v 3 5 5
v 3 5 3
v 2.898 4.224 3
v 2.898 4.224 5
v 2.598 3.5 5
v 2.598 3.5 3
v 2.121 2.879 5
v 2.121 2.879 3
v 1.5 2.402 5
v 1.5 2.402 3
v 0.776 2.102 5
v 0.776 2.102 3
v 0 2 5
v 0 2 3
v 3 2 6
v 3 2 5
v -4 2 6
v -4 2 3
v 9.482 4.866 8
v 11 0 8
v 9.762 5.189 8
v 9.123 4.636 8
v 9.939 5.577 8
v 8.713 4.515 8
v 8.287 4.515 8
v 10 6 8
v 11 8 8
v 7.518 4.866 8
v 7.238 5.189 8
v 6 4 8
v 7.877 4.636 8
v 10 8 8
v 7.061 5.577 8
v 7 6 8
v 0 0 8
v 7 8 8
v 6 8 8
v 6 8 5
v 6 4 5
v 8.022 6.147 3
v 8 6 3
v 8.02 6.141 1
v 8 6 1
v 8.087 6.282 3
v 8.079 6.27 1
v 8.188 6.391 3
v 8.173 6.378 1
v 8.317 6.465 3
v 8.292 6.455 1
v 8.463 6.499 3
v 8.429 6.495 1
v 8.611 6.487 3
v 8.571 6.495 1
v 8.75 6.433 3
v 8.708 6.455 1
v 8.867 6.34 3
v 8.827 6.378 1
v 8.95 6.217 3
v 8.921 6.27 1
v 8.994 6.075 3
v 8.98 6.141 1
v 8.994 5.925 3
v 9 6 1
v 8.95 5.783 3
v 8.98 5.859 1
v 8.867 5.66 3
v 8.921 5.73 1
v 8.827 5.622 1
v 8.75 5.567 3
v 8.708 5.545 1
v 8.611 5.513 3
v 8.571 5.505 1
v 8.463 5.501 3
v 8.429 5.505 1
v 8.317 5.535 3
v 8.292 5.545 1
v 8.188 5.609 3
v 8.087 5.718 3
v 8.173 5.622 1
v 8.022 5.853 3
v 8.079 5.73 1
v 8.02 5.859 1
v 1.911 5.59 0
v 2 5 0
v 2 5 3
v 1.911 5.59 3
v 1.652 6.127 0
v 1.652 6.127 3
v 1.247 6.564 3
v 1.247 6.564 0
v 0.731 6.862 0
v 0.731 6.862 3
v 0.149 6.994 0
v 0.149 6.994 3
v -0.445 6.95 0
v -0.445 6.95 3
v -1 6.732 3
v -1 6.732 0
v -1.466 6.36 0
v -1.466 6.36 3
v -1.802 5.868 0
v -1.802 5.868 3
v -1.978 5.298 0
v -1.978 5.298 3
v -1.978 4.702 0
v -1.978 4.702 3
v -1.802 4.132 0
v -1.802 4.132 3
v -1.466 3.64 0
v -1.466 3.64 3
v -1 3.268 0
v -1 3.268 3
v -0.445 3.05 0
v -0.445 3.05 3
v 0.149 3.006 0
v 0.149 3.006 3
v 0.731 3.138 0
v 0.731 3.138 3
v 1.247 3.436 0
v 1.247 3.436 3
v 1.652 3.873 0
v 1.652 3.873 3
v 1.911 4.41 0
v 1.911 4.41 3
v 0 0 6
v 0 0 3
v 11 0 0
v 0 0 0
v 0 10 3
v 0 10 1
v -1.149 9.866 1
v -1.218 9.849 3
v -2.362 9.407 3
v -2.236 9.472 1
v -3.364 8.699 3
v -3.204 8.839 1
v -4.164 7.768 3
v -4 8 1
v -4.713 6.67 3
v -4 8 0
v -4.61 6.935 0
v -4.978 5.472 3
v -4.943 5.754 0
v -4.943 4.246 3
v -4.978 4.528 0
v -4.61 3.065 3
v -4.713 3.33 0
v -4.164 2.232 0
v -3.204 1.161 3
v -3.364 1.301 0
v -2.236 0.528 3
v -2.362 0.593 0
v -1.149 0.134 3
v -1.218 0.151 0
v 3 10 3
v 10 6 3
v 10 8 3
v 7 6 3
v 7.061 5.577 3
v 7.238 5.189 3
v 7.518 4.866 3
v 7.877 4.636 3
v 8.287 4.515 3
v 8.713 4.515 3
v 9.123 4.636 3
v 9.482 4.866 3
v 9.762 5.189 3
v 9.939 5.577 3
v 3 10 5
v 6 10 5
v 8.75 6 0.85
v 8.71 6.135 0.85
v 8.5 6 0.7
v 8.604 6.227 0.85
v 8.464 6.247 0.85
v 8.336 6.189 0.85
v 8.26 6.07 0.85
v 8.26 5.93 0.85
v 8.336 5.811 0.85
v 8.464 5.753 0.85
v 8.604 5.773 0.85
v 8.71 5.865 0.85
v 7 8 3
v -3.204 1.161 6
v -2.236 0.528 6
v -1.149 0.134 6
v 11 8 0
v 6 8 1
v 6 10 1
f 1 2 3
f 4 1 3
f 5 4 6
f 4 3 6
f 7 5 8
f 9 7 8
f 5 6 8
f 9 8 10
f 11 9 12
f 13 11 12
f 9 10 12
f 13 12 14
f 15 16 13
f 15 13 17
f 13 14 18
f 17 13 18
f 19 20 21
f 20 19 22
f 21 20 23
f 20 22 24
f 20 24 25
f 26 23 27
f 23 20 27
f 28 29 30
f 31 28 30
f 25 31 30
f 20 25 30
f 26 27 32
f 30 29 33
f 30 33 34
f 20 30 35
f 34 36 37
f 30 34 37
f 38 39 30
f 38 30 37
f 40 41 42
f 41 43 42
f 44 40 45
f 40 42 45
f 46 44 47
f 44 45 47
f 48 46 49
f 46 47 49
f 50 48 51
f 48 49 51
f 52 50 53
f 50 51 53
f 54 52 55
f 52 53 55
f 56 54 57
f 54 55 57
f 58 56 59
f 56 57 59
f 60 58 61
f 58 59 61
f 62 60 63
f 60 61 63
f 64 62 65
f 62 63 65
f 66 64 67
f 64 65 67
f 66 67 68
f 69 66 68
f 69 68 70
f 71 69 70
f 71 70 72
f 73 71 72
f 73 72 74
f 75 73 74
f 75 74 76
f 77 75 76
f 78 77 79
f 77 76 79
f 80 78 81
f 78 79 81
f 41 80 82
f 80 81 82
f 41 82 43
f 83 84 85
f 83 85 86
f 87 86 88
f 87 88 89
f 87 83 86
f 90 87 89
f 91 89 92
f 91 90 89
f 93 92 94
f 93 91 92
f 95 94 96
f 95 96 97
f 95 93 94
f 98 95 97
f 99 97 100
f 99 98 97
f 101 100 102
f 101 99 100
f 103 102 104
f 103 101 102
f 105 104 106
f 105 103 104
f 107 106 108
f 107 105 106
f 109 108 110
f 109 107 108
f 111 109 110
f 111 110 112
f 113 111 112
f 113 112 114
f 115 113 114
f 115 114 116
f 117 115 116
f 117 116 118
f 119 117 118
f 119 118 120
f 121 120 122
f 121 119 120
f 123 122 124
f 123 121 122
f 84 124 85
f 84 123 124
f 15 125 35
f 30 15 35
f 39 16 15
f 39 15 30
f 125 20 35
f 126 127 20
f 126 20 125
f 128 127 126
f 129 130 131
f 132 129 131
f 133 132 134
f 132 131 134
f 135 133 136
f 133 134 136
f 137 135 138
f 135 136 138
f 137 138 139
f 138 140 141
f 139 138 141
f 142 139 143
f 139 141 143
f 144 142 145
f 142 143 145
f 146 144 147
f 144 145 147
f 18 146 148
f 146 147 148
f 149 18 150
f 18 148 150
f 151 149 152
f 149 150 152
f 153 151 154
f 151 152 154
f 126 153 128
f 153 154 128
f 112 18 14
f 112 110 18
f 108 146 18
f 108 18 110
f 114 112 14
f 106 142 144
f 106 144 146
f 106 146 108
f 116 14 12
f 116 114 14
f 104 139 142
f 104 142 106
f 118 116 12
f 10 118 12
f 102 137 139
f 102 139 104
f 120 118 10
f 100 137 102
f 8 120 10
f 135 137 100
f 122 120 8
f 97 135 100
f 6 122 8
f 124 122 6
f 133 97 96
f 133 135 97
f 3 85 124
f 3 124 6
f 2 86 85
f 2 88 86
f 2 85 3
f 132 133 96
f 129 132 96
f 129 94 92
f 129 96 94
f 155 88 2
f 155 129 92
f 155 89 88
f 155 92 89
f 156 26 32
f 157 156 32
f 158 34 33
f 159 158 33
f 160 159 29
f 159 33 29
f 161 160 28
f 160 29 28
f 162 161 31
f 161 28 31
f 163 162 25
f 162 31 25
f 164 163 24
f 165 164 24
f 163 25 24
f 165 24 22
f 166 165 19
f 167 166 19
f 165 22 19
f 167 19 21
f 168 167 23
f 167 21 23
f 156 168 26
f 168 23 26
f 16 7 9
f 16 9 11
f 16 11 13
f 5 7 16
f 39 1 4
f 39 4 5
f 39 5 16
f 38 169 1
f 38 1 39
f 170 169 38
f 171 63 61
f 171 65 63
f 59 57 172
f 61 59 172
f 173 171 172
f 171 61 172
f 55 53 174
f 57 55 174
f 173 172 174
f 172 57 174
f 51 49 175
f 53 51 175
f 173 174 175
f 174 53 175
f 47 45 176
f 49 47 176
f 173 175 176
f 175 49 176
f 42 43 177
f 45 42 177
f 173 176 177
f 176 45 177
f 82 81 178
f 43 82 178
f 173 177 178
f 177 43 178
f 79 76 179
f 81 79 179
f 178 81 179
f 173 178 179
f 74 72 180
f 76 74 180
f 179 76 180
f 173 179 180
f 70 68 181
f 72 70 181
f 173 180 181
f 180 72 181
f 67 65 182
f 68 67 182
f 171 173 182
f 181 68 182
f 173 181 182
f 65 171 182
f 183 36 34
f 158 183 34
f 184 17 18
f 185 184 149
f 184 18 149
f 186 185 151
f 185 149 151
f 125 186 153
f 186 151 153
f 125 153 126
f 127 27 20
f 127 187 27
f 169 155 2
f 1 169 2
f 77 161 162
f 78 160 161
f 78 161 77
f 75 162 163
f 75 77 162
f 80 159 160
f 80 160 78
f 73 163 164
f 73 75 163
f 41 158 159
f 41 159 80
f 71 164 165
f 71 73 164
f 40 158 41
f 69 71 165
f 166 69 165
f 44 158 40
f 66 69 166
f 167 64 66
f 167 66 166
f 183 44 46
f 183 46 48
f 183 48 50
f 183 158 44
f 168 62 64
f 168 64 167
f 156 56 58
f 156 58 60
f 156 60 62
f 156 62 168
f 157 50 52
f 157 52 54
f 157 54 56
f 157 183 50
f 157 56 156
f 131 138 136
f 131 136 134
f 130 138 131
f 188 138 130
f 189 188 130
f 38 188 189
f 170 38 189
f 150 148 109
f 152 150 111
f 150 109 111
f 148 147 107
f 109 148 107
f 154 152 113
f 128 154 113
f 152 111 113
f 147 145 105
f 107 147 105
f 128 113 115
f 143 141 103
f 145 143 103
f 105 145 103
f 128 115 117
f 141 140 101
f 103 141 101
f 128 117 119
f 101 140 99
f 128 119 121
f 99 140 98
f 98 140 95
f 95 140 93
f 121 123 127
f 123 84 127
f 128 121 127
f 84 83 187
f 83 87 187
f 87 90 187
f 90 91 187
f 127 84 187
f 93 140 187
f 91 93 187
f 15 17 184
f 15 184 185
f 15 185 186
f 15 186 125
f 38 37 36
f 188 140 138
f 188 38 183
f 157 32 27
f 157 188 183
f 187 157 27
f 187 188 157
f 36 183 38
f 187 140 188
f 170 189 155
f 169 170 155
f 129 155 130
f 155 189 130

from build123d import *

# Parameters (mm, degrees)
SKETCH1_R                 = 2
BOSS_EXTRUDE1_DEPTH       = 3
SKETCH2_W                 = 1
SKETCH2_H                 = 2
CUT_EXTRUDE1_DEPTH        = 15
SKETCH3_R                 = 0.5
BOSS_EXTRUDE2_DEPTH       = 5
CUT_EXTRUDE2_DEPTH        = 5
BOSS_EXTRUDE3_DEPTH       = 3
BOSS_EXTRUDE4_DEPTH       = 2
F_1_0MM_DOWEL_HOLE1_D     = 1
F_1_0MM_DOWEL_HOLE1_DEPTH = 2
F_1_0MM_DOWEL_HOLE1_TIP   = 0.30043031


with BuildPart() as part:
    # Sketch1 → Boss-Extrude1 (new body)
    with BuildSketch(Plane.XY):
        with BuildLine():
            Line((0, 0), (11, 0))
            Line((11, 0), (11, 8))
            Line((11, 8), (6, 8))
            Line((6, 8), (6, 10))
            Line((6, 10), (0, 10))
            ThreePointArc((0, 10), (-5, 5), (0, 0))
        make_face()
        with Locations((0, 5)):
            Circle(SKETCH1_R, mode=Mode.SUBTRACT)
    extrude(amount=BOSS_EXTRUDE1_DEPTH)

    # Sketch2 → Cut-Extrude1 (cut)
    with BuildSketch(Plane(origin=(6, 0, 0), x_dir=(0, 0, -1), z_dir=(1, 0, 0))):
        with Locations((-0.5, 9)):
            Rectangle(SKETCH2_W, SKETCH2_H)
    extrude(amount=-CUT_EXTRUDE1_DEPTH, mode=Mode.SUBTRACT)

    # Sketch3 → Boss-Extrude2 (add)
    with BuildSketch(Plane.XY.offset(3)):
        Polygon((11, 8), (11, 0), (0, 0), (6, 4), (6, 8), align=None)
        with Locations((8.5, 6)):
            Circle(SKETCH3_R, mode=Mode.SUBTRACT)
    extrude(amount=BOSS_EXTRUDE2_DEPTH)

    # Sketch4 → Cut-Extrude2 (cut)
    with BuildSketch(Plane.XY.offset(8)):
        with BuildLine():
            Line((7, 8), (7, 6))
            ThreePointArc((7, 6), (8.5, 4.5), (10, 6))
            Line((10, 6), (10, 8))
            Line((10, 8), (7, 8))
        make_face()
    extrude(amount=-CUT_EXTRUDE2_DEPTH, mode=Mode.SUBTRACT)

    # Sketch5 → Boss-Extrude3 (add)
    with BuildSketch(Plane.XY.offset(3)):
        with BuildLine():
            Line((3, 2), (-4, 2))
            ThreePointArc((-4, 2), (-2.236067977, 0.527864045), (0, 0))
            Line((0, 0), (3, 2))
        make_face()
    extrude(amount=BOSS_EXTRUDE3_DEPTH)

    # Sketch6 → Boss-Extrude4 (add)
    with BuildSketch(Plane.XY.offset(3)):
        with BuildLine():
            Line((3, 10), (3, 5))
            ThreePointArc((3, 5), (2.121320344, 2.878679656), (0, 2))
            Line((0, 2), (3, 2))
            Line((3, 2), (6, 4))
            Line((6, 4), (6, 10))
            Line((6, 10), (3, 10))
        make_face()
    extrude(amount=BOSS_EXTRUDE4_DEPTH)

    # Ø1.0mm Dowel Hole1
    with Locations(Plane(origin=(8.5, 6, 3), x_dir=(1, 0, 0), z_dir=(0, 0, 1))):
        with Locations((0, 0)):
            Hole(F_1_0MM_DOWEL_HOLE1_D / 2, depth=F_1_0MM_DOWEL_HOLE1_DEPTH)
            with Locations((0, 0, -(F_1_0MM_DOWEL_HOLE1_DEPTH + F_1_0MM_DOWEL_HOLE1_TIP / 2))):  # 118° drill point
                Cone(0, F_1_0MM_DOWEL_HOLE1_D / 2, F_1_0MM_DOWEL_HOLE1_TIP, mode=Mode.SUBTRACT)


solid = part.part
